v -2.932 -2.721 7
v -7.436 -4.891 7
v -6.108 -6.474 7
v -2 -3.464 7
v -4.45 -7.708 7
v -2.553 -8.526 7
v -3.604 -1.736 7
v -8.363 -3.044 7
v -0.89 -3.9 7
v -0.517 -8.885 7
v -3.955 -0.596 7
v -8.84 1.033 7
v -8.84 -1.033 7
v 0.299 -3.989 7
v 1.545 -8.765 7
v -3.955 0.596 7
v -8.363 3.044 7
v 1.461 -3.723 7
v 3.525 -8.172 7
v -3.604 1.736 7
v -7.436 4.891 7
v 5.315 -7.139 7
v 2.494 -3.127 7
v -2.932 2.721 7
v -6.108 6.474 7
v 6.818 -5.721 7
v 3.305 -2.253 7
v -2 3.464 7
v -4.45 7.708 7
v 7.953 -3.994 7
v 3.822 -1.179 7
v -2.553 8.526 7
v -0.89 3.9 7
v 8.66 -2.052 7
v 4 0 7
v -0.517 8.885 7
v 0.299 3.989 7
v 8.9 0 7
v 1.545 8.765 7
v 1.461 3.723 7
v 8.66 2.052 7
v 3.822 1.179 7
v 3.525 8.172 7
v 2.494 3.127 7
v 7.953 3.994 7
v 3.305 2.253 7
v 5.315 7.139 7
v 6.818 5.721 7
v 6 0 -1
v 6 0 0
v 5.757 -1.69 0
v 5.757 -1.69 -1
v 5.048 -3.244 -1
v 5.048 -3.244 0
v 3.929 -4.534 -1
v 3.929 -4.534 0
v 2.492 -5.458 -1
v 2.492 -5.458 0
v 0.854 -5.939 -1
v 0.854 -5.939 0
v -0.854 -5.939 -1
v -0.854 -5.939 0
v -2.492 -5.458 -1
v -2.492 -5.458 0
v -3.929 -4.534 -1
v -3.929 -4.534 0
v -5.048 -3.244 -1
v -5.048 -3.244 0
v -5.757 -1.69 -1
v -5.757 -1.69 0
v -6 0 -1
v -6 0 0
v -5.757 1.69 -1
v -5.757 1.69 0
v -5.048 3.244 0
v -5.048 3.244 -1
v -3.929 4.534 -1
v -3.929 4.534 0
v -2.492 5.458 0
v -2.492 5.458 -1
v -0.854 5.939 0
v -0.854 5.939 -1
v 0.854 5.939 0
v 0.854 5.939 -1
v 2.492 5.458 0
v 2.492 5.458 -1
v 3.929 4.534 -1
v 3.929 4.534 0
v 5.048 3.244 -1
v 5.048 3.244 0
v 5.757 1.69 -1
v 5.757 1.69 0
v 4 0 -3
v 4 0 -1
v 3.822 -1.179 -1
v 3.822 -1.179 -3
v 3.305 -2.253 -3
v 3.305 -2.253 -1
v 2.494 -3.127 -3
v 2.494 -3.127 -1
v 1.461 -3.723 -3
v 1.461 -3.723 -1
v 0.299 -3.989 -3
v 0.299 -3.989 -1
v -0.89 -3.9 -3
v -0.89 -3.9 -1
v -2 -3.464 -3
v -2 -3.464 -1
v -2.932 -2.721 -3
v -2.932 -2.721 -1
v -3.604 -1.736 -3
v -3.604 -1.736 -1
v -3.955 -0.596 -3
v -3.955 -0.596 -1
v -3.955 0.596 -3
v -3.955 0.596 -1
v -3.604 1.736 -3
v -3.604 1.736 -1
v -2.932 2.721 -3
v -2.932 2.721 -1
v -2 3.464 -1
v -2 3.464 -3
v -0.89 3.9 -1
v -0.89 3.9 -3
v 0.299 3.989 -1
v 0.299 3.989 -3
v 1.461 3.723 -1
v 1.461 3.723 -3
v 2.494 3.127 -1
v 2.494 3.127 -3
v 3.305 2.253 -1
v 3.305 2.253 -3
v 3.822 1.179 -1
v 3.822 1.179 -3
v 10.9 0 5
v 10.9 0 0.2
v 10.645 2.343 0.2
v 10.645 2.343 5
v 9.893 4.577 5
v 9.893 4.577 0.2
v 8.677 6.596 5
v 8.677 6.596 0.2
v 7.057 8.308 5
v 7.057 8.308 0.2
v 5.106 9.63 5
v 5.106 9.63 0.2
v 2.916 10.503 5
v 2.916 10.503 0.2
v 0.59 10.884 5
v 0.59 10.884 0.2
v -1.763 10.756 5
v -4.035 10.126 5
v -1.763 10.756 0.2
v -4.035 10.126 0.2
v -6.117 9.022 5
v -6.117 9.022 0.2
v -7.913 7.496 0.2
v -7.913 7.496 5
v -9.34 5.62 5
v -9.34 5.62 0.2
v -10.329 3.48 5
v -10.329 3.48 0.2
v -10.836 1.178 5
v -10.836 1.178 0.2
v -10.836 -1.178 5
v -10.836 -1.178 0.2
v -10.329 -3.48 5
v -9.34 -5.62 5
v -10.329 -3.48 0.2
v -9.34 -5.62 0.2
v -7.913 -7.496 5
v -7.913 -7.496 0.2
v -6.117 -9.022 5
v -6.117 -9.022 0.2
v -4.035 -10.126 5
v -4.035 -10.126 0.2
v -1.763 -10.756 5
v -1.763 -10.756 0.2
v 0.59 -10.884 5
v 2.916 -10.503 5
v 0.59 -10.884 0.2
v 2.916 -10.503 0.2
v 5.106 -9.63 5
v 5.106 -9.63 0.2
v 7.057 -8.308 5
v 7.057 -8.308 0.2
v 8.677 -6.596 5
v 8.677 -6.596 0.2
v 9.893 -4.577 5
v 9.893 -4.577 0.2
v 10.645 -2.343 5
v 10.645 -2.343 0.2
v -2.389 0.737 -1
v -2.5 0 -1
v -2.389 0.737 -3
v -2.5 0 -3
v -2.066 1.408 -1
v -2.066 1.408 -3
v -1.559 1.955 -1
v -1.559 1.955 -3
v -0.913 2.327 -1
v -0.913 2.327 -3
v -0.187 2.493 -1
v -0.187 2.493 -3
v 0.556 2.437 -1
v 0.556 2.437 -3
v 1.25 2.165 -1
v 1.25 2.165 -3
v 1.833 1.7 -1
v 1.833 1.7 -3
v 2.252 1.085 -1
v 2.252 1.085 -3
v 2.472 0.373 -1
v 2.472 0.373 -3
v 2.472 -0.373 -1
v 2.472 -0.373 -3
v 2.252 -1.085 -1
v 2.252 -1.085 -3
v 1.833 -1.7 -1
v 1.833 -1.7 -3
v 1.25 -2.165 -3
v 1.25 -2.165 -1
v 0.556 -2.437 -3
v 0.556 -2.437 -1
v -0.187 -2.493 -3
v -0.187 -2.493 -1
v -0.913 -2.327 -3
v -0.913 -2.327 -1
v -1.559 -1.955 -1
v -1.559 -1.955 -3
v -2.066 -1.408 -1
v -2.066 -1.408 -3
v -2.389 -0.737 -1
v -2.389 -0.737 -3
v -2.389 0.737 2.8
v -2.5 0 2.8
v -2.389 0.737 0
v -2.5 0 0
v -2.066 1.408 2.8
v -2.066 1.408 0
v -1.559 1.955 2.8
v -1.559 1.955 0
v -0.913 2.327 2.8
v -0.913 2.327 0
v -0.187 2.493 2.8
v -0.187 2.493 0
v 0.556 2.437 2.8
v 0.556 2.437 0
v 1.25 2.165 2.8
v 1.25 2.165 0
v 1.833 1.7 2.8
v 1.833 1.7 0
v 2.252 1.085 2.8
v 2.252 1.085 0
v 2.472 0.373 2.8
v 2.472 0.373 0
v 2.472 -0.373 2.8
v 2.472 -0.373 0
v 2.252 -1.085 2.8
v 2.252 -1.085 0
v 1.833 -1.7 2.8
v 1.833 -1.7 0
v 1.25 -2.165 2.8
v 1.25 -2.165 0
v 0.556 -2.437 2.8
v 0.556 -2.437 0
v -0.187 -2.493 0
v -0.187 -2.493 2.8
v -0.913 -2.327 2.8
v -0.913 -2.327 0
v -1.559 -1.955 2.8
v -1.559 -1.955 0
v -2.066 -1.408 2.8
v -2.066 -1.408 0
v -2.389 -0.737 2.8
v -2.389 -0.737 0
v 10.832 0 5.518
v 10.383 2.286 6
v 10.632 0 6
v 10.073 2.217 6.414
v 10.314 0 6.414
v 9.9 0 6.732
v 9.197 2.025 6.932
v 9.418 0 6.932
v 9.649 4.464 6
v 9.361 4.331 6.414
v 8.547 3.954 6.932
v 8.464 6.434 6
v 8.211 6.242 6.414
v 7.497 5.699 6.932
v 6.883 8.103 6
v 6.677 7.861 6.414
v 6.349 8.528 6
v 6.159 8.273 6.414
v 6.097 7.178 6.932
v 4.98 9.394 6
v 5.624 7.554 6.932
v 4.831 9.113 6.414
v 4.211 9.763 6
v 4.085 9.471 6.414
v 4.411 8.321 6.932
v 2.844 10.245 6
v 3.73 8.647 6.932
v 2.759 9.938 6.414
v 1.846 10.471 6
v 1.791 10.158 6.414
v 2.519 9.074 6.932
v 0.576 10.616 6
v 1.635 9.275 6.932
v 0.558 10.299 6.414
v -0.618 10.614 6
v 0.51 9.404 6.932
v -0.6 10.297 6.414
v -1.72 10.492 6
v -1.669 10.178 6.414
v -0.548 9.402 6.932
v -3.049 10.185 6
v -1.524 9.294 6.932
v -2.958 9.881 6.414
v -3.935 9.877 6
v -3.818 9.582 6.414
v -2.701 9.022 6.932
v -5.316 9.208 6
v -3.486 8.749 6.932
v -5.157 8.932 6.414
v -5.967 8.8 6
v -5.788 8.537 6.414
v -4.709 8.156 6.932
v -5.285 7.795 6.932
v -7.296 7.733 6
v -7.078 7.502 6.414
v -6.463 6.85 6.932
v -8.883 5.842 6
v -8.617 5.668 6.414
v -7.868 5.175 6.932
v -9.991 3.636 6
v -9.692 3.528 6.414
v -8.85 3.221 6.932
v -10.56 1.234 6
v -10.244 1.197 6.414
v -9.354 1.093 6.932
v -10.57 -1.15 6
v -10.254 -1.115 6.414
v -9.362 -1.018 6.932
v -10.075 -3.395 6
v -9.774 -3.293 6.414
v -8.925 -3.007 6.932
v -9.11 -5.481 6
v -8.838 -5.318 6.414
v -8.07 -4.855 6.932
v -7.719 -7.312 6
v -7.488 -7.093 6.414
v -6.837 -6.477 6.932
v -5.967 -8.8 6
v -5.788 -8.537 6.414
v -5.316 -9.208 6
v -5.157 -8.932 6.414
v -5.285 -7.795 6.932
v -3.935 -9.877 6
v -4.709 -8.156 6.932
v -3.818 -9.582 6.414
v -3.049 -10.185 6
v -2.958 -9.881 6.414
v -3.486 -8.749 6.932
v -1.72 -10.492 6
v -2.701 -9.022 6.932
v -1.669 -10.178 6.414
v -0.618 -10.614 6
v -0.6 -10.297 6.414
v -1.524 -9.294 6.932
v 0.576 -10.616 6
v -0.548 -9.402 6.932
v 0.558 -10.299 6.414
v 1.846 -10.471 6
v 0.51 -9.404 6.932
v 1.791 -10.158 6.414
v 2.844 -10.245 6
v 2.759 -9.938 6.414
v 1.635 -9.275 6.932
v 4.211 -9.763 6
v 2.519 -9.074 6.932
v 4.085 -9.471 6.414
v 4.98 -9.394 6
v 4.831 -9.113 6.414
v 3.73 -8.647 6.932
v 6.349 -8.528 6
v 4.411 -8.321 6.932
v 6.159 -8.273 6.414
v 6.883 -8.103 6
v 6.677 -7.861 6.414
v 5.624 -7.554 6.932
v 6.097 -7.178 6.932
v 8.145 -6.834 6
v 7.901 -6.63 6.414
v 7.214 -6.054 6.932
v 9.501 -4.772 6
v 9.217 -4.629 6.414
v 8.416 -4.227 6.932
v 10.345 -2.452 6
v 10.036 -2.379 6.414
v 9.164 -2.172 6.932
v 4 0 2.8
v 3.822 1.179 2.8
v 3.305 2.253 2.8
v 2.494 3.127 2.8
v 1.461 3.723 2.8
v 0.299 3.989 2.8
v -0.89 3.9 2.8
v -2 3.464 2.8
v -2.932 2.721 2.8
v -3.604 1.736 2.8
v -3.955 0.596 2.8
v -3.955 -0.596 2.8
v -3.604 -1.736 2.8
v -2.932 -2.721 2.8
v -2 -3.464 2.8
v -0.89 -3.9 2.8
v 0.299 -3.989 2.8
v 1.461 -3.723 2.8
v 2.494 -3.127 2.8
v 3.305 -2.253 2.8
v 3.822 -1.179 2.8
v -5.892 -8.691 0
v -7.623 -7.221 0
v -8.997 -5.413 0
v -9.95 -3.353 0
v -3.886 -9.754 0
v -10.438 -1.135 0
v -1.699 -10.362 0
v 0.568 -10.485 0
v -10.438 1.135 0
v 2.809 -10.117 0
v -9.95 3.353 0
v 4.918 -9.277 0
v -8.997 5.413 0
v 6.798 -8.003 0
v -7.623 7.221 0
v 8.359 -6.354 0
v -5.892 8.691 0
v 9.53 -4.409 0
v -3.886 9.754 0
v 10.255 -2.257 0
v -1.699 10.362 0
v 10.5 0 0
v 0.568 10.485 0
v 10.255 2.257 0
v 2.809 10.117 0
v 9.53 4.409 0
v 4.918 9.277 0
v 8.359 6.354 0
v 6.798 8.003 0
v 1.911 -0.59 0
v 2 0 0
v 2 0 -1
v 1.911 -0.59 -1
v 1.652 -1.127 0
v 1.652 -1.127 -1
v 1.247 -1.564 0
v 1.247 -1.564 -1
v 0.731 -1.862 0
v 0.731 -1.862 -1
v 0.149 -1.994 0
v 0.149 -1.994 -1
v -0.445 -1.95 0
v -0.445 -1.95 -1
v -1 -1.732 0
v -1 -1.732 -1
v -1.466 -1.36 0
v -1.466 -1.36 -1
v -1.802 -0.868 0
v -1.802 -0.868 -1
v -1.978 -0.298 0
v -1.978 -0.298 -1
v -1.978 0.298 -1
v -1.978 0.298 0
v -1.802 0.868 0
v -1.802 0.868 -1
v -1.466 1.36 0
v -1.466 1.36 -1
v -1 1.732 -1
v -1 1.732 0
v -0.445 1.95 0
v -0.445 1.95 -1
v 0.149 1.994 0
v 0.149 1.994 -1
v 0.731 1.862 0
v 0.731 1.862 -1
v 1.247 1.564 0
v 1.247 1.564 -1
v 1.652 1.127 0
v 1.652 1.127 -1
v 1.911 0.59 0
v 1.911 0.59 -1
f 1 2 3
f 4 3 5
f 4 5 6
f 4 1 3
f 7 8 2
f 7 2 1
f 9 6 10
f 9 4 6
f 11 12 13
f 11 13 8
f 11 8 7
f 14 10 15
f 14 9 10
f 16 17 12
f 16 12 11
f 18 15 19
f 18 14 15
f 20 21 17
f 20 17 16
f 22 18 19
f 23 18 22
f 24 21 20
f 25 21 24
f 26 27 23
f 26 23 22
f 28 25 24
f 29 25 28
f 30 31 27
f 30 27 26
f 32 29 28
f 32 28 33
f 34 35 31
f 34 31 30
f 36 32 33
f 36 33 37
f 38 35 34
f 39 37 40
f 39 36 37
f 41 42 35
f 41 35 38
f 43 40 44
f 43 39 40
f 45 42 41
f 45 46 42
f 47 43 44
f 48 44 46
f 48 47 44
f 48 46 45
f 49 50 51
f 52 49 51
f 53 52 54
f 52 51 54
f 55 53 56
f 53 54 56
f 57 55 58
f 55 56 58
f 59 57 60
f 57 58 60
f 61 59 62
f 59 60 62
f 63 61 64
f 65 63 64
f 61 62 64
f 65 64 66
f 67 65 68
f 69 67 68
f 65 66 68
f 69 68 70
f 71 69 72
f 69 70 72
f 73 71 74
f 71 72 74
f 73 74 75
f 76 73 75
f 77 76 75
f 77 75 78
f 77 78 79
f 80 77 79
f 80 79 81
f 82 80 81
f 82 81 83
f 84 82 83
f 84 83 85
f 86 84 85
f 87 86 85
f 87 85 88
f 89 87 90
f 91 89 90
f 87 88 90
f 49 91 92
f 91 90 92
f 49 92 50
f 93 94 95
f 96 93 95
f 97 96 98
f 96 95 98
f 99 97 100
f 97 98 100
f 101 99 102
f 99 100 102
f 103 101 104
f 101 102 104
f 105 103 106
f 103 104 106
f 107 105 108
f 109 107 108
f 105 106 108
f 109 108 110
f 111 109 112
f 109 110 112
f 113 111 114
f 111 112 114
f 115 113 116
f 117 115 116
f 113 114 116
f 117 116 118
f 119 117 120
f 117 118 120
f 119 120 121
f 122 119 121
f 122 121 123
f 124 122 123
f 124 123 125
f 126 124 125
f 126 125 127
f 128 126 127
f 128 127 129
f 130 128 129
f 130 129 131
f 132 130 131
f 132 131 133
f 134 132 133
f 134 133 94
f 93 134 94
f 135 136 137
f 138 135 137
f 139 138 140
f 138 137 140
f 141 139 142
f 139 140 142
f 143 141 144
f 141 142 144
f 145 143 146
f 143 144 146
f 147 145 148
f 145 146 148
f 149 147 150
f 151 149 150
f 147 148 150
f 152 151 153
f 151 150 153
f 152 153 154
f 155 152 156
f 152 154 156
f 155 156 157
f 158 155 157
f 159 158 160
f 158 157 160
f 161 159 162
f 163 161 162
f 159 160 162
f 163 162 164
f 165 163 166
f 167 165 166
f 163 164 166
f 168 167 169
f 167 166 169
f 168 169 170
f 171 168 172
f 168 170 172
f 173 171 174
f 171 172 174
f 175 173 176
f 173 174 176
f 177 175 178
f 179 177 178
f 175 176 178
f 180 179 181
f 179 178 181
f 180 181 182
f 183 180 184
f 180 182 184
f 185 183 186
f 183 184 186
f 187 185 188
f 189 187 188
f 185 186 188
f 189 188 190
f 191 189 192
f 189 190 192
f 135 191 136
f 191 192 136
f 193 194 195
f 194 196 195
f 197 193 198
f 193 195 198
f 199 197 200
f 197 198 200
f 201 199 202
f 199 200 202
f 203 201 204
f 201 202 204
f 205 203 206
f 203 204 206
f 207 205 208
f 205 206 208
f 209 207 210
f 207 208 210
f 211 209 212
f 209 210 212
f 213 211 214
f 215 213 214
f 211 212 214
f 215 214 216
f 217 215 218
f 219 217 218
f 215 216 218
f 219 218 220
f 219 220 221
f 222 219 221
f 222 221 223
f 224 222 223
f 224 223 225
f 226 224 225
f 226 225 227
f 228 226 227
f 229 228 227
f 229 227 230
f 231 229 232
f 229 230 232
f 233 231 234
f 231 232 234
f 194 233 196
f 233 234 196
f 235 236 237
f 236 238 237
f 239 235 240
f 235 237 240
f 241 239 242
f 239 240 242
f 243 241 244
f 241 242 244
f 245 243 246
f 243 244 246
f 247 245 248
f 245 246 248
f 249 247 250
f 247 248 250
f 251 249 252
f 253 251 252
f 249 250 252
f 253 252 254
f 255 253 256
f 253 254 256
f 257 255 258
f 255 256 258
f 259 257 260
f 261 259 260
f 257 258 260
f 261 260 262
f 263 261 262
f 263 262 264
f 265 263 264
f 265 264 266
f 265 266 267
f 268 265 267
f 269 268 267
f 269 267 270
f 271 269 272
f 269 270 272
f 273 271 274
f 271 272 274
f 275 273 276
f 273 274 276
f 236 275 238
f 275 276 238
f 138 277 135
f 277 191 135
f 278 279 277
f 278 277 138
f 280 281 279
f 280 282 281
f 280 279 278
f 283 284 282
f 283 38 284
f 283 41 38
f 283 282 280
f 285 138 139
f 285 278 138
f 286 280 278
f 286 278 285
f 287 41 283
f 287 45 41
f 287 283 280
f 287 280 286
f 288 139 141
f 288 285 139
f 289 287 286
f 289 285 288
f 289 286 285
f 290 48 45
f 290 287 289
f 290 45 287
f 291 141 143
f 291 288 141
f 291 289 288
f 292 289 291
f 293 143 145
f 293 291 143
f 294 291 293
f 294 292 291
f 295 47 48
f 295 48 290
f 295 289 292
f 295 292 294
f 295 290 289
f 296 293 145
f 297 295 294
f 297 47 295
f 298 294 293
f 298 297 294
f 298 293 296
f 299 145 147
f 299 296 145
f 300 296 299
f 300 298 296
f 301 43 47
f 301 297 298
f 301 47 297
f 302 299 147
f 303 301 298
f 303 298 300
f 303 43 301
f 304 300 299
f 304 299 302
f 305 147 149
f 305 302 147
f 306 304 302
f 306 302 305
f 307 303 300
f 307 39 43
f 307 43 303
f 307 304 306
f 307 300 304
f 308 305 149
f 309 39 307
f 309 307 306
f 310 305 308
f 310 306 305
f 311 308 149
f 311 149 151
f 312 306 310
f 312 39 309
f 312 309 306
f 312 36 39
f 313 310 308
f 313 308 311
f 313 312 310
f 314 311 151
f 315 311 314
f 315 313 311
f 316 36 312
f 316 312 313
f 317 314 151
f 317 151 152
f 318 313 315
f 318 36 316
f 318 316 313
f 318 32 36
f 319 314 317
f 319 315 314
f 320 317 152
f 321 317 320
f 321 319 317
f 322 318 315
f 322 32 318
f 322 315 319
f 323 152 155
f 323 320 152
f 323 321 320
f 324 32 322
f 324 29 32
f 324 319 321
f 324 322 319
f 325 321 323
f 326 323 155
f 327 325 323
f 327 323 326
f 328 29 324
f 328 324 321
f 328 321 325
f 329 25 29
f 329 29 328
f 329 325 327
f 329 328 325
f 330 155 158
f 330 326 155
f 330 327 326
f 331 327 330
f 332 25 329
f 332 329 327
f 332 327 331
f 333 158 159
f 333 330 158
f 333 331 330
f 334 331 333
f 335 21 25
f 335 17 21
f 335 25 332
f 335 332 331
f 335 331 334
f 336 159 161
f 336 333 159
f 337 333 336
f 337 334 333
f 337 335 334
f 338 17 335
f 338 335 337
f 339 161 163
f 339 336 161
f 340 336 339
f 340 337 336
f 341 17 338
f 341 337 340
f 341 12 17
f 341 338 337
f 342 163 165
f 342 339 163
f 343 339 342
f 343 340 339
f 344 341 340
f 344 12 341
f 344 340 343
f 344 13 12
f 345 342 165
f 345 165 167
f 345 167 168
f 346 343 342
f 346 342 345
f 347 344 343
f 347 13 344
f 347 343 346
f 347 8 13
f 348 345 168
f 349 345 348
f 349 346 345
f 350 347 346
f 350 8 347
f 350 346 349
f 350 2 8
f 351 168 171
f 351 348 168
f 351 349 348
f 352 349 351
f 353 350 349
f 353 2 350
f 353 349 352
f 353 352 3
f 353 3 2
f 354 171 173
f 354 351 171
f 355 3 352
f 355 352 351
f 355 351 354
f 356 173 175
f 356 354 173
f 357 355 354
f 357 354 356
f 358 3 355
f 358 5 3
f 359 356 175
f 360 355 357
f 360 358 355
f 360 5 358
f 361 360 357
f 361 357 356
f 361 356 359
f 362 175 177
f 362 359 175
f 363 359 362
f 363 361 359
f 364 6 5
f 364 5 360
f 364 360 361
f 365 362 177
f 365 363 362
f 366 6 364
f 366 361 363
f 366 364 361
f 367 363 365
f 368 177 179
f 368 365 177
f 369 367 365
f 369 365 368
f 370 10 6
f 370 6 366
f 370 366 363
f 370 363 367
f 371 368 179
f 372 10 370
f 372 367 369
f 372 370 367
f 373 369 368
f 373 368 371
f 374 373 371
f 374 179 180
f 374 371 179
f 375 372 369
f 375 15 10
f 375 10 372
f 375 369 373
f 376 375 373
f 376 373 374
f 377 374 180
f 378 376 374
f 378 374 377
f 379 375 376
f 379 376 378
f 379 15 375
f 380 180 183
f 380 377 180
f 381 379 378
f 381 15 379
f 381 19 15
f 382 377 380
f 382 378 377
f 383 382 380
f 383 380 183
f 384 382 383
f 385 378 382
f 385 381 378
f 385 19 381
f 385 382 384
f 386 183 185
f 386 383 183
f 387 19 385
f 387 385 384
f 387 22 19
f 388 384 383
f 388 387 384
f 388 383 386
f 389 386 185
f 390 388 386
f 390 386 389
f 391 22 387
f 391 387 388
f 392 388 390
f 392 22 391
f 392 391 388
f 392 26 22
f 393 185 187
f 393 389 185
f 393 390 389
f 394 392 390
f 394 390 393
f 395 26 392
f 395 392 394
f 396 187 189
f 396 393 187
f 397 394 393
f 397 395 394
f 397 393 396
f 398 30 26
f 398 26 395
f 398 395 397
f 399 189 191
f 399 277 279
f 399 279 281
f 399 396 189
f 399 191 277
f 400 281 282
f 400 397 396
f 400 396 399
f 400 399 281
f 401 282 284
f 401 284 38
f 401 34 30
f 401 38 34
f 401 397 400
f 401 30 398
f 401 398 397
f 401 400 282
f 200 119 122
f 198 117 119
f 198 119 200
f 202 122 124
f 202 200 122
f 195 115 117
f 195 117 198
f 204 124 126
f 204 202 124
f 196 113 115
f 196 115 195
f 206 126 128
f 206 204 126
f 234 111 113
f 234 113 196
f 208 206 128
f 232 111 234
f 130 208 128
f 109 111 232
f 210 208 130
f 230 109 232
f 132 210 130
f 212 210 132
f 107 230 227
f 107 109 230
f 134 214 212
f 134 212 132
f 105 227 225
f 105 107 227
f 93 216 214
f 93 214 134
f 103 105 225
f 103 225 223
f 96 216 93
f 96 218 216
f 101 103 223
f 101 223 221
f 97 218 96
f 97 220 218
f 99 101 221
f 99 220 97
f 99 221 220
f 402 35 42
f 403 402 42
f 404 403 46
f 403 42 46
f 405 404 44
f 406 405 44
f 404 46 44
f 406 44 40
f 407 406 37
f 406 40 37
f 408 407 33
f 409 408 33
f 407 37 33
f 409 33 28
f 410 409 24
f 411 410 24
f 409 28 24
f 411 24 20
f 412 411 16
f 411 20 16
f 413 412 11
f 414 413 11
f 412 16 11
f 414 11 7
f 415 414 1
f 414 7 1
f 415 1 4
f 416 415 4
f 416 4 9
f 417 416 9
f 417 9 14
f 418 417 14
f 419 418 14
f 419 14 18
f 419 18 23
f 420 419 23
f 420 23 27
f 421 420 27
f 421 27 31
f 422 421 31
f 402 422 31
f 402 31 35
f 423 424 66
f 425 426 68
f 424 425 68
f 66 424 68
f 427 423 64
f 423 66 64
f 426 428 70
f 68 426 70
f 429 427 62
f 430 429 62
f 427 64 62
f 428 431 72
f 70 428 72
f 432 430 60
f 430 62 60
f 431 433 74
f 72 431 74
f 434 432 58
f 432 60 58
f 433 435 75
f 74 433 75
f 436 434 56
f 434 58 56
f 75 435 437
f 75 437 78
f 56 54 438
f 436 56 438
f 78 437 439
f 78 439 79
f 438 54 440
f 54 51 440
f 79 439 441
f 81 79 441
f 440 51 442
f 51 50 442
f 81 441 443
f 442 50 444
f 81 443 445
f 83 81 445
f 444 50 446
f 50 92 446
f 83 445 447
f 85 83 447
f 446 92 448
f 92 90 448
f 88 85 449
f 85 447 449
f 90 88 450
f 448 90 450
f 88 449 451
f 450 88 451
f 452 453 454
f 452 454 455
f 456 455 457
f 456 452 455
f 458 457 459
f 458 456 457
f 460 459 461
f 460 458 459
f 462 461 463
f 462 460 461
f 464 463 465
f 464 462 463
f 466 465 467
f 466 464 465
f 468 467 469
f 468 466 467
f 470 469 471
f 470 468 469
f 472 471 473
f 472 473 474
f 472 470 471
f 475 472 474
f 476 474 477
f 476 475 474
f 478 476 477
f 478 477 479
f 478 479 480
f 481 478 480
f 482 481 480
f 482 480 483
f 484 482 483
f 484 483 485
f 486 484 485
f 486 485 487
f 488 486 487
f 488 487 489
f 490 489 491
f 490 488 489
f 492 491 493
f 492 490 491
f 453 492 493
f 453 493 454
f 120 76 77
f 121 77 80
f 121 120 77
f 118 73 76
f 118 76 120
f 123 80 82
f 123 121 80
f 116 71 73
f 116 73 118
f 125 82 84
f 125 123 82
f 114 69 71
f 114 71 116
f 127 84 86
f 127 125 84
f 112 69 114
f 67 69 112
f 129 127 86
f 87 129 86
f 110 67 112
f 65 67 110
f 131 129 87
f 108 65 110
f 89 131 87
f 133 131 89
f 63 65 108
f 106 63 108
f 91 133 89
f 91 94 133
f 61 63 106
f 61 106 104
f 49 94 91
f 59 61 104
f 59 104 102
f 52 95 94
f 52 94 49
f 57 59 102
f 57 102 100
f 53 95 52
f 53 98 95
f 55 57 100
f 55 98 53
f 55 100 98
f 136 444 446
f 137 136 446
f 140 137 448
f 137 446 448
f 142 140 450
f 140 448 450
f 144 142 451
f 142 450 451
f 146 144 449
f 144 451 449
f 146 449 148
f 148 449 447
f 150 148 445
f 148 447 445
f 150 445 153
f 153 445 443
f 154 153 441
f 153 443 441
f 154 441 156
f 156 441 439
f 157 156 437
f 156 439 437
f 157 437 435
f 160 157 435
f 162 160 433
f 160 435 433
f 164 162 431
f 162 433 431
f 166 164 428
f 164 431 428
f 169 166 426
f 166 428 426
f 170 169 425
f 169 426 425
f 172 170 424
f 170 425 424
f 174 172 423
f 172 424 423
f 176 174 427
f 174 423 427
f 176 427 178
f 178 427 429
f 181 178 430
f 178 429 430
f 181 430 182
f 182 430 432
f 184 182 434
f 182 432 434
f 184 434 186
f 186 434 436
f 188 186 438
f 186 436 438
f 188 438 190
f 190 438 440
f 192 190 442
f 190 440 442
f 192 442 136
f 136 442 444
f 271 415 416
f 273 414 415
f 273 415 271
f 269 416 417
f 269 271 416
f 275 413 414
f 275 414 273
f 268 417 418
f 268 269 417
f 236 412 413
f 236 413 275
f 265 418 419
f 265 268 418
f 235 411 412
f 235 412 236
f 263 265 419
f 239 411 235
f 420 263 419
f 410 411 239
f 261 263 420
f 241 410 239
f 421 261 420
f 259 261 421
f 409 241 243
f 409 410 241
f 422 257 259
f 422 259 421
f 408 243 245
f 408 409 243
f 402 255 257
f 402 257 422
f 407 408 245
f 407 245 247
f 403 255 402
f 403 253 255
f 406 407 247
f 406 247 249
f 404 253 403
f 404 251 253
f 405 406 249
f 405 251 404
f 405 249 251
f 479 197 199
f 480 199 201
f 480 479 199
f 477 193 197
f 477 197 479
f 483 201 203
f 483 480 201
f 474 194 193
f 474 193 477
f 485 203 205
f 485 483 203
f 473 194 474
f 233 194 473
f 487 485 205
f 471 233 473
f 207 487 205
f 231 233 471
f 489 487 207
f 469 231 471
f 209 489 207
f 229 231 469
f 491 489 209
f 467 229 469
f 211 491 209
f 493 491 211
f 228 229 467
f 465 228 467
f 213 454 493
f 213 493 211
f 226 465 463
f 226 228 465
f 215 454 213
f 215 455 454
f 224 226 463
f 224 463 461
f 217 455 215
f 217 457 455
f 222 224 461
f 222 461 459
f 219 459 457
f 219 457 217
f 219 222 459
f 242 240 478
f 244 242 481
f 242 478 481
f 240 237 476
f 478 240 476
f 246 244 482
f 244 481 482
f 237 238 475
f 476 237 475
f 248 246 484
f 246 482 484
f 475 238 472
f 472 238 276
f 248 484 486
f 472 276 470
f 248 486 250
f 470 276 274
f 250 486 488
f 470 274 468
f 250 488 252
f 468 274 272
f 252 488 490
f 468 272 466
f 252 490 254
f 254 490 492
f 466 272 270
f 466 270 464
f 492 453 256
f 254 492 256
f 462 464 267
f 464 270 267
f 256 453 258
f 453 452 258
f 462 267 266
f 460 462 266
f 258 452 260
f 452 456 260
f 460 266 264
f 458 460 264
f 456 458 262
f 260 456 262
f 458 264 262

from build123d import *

# Parameters (mm, degrees)
F0_R           = 10.9
F1_DEPTH       = 7
F2_SIZE2       = 0.4
F2_SIZE        = 0.2
F3_R           = 2
F4_R           = 4
F5_DEPTH       = 3
F7_D           = 5
F7_DEPTH       = 10
F7_CBORE_D     = 8
F7_CBORE_DEPTH = 4.2
F8_R           = 6
F8_R_2         = 2
F9_DEPTH       = 1


with BuildPart() as f1:
    # F0 (on Top) → F1 (new body)
    with BuildSketch(Plane.XY):
        Circle(F0_R)
    extrude(amount=F1_DEPTH)

    # F2
    f2_edges = [f1.edges().sort_by_distance(p)[0] for p in [
        (-10.9, 0, 0),
    ]]
    chamfer(f2_edges, length=F2_SIZE, length2=F2_SIZE2)

    # F3
    f3_edges = [f1.edges().sort_by_distance(p)[0] for p in [
        (-10.9, 0, 7),
    ]]
    fillet(f3_edges, radius=F3_R)

    # F4 (on face) → F5 (join)
    with BuildSketch(Plane(origin=(0, 0, 0), x_dir=(1, 0, 0), z_dir=(0, 0, -1))):
        Circle(F4_R)
    extrude(amount=F5_DEPTH)

    # F7
    with Locations(Plane.XY.offset(7)):
        with Locations((0, 0)):
            CounterBoreHole(F7_D / 2, F7_CBORE_D / 2, F7_CBORE_DEPTH, depth=F7_DEPTH)

    # F8 (on face) → F9 (join)
    with BuildSketch(Plane(origin=(0, 0, 0), x_dir=(1, 0, 0), z_dir=(0, 0, -1))):
        Circle(F8_R)
        Circle(F8_R_2, mode=Mode.SUBTRACT)
    extrude(amount=F9_DEPTH)


solid = f1.part
